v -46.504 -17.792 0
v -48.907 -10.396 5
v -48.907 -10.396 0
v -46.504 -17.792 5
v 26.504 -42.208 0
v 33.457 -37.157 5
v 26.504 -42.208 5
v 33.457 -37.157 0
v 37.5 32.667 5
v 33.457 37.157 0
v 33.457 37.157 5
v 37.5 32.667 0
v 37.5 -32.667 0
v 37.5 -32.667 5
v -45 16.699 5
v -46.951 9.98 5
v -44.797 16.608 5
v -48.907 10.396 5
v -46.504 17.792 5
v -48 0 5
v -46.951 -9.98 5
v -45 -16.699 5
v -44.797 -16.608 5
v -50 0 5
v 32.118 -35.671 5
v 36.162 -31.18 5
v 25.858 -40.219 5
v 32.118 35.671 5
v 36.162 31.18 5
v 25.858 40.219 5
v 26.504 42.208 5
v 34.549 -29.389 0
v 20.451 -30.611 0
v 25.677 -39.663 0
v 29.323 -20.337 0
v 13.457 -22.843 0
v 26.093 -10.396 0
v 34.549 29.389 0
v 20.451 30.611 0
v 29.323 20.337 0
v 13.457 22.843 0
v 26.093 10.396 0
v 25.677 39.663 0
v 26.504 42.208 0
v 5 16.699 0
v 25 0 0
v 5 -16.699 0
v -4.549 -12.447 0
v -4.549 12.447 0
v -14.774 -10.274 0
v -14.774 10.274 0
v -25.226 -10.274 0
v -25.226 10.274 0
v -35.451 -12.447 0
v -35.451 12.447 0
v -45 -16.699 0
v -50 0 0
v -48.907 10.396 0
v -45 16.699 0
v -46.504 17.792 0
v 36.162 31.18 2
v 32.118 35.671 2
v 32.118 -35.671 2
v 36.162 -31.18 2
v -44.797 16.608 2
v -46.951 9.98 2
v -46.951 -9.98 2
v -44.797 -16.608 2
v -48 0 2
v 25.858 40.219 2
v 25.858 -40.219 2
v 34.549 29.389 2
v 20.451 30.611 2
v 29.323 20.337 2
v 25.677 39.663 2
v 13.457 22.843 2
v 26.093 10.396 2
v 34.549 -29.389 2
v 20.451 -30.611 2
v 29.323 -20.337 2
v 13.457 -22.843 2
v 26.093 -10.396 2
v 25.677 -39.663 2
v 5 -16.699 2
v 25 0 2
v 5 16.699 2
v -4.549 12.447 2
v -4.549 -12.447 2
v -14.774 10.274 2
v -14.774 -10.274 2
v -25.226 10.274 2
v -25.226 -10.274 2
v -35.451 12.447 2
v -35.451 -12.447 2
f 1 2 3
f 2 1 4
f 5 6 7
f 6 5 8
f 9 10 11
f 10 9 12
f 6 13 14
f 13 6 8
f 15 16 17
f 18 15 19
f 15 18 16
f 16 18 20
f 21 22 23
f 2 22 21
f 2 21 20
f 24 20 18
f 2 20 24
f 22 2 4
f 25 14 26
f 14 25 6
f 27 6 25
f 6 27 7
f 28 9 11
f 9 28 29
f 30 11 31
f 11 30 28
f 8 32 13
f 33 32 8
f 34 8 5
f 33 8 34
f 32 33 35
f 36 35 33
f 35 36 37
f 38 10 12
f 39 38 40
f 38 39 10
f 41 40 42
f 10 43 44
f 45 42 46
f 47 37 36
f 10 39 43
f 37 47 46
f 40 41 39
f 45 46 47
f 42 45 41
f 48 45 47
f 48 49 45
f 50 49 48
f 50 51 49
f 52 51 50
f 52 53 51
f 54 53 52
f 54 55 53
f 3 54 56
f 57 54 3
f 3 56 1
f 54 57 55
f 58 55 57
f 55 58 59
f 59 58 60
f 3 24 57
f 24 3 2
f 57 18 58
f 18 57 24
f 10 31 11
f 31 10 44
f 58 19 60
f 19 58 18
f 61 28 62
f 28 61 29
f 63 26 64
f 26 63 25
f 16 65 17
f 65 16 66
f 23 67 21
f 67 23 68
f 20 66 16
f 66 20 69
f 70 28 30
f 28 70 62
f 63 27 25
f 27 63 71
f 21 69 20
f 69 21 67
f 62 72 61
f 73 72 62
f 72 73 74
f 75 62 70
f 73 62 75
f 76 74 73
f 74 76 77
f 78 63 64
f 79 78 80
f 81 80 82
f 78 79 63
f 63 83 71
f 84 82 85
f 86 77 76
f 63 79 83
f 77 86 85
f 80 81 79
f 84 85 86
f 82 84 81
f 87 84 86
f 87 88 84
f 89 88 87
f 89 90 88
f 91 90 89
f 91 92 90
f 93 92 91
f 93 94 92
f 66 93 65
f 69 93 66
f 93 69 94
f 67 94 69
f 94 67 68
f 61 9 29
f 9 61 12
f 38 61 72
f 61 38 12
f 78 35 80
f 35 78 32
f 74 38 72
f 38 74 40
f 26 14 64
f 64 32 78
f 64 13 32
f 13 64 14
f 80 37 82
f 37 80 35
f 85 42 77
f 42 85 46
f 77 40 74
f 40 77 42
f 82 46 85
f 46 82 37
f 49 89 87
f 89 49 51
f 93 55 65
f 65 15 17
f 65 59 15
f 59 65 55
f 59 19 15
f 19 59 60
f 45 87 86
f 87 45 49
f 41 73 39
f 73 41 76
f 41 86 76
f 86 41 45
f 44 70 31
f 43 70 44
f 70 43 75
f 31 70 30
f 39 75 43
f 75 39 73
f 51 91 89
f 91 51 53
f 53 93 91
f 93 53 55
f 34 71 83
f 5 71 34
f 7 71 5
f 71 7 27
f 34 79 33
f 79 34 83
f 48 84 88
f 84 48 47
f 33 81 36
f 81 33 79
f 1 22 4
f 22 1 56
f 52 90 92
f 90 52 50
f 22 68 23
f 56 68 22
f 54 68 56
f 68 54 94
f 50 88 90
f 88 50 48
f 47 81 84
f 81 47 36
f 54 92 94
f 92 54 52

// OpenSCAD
// The TashProtect(TM)
// copyright SJ Hindmarch 2015

height=5;
radius=50;
thickness=2;

difference(){
	cylinder(h=height,r=radius);
	translate([0,0,thickness])cylinder(h=height-thickness,r=radius-thickness);
	translate([radius*1.5,0,0])cylinder(h=height,r=radius);
	translate([-20,60,0])cylinder(h=height,r=radius);
	translate([-20,-60,0])cylinder(h=height,r=radius);
	
}
